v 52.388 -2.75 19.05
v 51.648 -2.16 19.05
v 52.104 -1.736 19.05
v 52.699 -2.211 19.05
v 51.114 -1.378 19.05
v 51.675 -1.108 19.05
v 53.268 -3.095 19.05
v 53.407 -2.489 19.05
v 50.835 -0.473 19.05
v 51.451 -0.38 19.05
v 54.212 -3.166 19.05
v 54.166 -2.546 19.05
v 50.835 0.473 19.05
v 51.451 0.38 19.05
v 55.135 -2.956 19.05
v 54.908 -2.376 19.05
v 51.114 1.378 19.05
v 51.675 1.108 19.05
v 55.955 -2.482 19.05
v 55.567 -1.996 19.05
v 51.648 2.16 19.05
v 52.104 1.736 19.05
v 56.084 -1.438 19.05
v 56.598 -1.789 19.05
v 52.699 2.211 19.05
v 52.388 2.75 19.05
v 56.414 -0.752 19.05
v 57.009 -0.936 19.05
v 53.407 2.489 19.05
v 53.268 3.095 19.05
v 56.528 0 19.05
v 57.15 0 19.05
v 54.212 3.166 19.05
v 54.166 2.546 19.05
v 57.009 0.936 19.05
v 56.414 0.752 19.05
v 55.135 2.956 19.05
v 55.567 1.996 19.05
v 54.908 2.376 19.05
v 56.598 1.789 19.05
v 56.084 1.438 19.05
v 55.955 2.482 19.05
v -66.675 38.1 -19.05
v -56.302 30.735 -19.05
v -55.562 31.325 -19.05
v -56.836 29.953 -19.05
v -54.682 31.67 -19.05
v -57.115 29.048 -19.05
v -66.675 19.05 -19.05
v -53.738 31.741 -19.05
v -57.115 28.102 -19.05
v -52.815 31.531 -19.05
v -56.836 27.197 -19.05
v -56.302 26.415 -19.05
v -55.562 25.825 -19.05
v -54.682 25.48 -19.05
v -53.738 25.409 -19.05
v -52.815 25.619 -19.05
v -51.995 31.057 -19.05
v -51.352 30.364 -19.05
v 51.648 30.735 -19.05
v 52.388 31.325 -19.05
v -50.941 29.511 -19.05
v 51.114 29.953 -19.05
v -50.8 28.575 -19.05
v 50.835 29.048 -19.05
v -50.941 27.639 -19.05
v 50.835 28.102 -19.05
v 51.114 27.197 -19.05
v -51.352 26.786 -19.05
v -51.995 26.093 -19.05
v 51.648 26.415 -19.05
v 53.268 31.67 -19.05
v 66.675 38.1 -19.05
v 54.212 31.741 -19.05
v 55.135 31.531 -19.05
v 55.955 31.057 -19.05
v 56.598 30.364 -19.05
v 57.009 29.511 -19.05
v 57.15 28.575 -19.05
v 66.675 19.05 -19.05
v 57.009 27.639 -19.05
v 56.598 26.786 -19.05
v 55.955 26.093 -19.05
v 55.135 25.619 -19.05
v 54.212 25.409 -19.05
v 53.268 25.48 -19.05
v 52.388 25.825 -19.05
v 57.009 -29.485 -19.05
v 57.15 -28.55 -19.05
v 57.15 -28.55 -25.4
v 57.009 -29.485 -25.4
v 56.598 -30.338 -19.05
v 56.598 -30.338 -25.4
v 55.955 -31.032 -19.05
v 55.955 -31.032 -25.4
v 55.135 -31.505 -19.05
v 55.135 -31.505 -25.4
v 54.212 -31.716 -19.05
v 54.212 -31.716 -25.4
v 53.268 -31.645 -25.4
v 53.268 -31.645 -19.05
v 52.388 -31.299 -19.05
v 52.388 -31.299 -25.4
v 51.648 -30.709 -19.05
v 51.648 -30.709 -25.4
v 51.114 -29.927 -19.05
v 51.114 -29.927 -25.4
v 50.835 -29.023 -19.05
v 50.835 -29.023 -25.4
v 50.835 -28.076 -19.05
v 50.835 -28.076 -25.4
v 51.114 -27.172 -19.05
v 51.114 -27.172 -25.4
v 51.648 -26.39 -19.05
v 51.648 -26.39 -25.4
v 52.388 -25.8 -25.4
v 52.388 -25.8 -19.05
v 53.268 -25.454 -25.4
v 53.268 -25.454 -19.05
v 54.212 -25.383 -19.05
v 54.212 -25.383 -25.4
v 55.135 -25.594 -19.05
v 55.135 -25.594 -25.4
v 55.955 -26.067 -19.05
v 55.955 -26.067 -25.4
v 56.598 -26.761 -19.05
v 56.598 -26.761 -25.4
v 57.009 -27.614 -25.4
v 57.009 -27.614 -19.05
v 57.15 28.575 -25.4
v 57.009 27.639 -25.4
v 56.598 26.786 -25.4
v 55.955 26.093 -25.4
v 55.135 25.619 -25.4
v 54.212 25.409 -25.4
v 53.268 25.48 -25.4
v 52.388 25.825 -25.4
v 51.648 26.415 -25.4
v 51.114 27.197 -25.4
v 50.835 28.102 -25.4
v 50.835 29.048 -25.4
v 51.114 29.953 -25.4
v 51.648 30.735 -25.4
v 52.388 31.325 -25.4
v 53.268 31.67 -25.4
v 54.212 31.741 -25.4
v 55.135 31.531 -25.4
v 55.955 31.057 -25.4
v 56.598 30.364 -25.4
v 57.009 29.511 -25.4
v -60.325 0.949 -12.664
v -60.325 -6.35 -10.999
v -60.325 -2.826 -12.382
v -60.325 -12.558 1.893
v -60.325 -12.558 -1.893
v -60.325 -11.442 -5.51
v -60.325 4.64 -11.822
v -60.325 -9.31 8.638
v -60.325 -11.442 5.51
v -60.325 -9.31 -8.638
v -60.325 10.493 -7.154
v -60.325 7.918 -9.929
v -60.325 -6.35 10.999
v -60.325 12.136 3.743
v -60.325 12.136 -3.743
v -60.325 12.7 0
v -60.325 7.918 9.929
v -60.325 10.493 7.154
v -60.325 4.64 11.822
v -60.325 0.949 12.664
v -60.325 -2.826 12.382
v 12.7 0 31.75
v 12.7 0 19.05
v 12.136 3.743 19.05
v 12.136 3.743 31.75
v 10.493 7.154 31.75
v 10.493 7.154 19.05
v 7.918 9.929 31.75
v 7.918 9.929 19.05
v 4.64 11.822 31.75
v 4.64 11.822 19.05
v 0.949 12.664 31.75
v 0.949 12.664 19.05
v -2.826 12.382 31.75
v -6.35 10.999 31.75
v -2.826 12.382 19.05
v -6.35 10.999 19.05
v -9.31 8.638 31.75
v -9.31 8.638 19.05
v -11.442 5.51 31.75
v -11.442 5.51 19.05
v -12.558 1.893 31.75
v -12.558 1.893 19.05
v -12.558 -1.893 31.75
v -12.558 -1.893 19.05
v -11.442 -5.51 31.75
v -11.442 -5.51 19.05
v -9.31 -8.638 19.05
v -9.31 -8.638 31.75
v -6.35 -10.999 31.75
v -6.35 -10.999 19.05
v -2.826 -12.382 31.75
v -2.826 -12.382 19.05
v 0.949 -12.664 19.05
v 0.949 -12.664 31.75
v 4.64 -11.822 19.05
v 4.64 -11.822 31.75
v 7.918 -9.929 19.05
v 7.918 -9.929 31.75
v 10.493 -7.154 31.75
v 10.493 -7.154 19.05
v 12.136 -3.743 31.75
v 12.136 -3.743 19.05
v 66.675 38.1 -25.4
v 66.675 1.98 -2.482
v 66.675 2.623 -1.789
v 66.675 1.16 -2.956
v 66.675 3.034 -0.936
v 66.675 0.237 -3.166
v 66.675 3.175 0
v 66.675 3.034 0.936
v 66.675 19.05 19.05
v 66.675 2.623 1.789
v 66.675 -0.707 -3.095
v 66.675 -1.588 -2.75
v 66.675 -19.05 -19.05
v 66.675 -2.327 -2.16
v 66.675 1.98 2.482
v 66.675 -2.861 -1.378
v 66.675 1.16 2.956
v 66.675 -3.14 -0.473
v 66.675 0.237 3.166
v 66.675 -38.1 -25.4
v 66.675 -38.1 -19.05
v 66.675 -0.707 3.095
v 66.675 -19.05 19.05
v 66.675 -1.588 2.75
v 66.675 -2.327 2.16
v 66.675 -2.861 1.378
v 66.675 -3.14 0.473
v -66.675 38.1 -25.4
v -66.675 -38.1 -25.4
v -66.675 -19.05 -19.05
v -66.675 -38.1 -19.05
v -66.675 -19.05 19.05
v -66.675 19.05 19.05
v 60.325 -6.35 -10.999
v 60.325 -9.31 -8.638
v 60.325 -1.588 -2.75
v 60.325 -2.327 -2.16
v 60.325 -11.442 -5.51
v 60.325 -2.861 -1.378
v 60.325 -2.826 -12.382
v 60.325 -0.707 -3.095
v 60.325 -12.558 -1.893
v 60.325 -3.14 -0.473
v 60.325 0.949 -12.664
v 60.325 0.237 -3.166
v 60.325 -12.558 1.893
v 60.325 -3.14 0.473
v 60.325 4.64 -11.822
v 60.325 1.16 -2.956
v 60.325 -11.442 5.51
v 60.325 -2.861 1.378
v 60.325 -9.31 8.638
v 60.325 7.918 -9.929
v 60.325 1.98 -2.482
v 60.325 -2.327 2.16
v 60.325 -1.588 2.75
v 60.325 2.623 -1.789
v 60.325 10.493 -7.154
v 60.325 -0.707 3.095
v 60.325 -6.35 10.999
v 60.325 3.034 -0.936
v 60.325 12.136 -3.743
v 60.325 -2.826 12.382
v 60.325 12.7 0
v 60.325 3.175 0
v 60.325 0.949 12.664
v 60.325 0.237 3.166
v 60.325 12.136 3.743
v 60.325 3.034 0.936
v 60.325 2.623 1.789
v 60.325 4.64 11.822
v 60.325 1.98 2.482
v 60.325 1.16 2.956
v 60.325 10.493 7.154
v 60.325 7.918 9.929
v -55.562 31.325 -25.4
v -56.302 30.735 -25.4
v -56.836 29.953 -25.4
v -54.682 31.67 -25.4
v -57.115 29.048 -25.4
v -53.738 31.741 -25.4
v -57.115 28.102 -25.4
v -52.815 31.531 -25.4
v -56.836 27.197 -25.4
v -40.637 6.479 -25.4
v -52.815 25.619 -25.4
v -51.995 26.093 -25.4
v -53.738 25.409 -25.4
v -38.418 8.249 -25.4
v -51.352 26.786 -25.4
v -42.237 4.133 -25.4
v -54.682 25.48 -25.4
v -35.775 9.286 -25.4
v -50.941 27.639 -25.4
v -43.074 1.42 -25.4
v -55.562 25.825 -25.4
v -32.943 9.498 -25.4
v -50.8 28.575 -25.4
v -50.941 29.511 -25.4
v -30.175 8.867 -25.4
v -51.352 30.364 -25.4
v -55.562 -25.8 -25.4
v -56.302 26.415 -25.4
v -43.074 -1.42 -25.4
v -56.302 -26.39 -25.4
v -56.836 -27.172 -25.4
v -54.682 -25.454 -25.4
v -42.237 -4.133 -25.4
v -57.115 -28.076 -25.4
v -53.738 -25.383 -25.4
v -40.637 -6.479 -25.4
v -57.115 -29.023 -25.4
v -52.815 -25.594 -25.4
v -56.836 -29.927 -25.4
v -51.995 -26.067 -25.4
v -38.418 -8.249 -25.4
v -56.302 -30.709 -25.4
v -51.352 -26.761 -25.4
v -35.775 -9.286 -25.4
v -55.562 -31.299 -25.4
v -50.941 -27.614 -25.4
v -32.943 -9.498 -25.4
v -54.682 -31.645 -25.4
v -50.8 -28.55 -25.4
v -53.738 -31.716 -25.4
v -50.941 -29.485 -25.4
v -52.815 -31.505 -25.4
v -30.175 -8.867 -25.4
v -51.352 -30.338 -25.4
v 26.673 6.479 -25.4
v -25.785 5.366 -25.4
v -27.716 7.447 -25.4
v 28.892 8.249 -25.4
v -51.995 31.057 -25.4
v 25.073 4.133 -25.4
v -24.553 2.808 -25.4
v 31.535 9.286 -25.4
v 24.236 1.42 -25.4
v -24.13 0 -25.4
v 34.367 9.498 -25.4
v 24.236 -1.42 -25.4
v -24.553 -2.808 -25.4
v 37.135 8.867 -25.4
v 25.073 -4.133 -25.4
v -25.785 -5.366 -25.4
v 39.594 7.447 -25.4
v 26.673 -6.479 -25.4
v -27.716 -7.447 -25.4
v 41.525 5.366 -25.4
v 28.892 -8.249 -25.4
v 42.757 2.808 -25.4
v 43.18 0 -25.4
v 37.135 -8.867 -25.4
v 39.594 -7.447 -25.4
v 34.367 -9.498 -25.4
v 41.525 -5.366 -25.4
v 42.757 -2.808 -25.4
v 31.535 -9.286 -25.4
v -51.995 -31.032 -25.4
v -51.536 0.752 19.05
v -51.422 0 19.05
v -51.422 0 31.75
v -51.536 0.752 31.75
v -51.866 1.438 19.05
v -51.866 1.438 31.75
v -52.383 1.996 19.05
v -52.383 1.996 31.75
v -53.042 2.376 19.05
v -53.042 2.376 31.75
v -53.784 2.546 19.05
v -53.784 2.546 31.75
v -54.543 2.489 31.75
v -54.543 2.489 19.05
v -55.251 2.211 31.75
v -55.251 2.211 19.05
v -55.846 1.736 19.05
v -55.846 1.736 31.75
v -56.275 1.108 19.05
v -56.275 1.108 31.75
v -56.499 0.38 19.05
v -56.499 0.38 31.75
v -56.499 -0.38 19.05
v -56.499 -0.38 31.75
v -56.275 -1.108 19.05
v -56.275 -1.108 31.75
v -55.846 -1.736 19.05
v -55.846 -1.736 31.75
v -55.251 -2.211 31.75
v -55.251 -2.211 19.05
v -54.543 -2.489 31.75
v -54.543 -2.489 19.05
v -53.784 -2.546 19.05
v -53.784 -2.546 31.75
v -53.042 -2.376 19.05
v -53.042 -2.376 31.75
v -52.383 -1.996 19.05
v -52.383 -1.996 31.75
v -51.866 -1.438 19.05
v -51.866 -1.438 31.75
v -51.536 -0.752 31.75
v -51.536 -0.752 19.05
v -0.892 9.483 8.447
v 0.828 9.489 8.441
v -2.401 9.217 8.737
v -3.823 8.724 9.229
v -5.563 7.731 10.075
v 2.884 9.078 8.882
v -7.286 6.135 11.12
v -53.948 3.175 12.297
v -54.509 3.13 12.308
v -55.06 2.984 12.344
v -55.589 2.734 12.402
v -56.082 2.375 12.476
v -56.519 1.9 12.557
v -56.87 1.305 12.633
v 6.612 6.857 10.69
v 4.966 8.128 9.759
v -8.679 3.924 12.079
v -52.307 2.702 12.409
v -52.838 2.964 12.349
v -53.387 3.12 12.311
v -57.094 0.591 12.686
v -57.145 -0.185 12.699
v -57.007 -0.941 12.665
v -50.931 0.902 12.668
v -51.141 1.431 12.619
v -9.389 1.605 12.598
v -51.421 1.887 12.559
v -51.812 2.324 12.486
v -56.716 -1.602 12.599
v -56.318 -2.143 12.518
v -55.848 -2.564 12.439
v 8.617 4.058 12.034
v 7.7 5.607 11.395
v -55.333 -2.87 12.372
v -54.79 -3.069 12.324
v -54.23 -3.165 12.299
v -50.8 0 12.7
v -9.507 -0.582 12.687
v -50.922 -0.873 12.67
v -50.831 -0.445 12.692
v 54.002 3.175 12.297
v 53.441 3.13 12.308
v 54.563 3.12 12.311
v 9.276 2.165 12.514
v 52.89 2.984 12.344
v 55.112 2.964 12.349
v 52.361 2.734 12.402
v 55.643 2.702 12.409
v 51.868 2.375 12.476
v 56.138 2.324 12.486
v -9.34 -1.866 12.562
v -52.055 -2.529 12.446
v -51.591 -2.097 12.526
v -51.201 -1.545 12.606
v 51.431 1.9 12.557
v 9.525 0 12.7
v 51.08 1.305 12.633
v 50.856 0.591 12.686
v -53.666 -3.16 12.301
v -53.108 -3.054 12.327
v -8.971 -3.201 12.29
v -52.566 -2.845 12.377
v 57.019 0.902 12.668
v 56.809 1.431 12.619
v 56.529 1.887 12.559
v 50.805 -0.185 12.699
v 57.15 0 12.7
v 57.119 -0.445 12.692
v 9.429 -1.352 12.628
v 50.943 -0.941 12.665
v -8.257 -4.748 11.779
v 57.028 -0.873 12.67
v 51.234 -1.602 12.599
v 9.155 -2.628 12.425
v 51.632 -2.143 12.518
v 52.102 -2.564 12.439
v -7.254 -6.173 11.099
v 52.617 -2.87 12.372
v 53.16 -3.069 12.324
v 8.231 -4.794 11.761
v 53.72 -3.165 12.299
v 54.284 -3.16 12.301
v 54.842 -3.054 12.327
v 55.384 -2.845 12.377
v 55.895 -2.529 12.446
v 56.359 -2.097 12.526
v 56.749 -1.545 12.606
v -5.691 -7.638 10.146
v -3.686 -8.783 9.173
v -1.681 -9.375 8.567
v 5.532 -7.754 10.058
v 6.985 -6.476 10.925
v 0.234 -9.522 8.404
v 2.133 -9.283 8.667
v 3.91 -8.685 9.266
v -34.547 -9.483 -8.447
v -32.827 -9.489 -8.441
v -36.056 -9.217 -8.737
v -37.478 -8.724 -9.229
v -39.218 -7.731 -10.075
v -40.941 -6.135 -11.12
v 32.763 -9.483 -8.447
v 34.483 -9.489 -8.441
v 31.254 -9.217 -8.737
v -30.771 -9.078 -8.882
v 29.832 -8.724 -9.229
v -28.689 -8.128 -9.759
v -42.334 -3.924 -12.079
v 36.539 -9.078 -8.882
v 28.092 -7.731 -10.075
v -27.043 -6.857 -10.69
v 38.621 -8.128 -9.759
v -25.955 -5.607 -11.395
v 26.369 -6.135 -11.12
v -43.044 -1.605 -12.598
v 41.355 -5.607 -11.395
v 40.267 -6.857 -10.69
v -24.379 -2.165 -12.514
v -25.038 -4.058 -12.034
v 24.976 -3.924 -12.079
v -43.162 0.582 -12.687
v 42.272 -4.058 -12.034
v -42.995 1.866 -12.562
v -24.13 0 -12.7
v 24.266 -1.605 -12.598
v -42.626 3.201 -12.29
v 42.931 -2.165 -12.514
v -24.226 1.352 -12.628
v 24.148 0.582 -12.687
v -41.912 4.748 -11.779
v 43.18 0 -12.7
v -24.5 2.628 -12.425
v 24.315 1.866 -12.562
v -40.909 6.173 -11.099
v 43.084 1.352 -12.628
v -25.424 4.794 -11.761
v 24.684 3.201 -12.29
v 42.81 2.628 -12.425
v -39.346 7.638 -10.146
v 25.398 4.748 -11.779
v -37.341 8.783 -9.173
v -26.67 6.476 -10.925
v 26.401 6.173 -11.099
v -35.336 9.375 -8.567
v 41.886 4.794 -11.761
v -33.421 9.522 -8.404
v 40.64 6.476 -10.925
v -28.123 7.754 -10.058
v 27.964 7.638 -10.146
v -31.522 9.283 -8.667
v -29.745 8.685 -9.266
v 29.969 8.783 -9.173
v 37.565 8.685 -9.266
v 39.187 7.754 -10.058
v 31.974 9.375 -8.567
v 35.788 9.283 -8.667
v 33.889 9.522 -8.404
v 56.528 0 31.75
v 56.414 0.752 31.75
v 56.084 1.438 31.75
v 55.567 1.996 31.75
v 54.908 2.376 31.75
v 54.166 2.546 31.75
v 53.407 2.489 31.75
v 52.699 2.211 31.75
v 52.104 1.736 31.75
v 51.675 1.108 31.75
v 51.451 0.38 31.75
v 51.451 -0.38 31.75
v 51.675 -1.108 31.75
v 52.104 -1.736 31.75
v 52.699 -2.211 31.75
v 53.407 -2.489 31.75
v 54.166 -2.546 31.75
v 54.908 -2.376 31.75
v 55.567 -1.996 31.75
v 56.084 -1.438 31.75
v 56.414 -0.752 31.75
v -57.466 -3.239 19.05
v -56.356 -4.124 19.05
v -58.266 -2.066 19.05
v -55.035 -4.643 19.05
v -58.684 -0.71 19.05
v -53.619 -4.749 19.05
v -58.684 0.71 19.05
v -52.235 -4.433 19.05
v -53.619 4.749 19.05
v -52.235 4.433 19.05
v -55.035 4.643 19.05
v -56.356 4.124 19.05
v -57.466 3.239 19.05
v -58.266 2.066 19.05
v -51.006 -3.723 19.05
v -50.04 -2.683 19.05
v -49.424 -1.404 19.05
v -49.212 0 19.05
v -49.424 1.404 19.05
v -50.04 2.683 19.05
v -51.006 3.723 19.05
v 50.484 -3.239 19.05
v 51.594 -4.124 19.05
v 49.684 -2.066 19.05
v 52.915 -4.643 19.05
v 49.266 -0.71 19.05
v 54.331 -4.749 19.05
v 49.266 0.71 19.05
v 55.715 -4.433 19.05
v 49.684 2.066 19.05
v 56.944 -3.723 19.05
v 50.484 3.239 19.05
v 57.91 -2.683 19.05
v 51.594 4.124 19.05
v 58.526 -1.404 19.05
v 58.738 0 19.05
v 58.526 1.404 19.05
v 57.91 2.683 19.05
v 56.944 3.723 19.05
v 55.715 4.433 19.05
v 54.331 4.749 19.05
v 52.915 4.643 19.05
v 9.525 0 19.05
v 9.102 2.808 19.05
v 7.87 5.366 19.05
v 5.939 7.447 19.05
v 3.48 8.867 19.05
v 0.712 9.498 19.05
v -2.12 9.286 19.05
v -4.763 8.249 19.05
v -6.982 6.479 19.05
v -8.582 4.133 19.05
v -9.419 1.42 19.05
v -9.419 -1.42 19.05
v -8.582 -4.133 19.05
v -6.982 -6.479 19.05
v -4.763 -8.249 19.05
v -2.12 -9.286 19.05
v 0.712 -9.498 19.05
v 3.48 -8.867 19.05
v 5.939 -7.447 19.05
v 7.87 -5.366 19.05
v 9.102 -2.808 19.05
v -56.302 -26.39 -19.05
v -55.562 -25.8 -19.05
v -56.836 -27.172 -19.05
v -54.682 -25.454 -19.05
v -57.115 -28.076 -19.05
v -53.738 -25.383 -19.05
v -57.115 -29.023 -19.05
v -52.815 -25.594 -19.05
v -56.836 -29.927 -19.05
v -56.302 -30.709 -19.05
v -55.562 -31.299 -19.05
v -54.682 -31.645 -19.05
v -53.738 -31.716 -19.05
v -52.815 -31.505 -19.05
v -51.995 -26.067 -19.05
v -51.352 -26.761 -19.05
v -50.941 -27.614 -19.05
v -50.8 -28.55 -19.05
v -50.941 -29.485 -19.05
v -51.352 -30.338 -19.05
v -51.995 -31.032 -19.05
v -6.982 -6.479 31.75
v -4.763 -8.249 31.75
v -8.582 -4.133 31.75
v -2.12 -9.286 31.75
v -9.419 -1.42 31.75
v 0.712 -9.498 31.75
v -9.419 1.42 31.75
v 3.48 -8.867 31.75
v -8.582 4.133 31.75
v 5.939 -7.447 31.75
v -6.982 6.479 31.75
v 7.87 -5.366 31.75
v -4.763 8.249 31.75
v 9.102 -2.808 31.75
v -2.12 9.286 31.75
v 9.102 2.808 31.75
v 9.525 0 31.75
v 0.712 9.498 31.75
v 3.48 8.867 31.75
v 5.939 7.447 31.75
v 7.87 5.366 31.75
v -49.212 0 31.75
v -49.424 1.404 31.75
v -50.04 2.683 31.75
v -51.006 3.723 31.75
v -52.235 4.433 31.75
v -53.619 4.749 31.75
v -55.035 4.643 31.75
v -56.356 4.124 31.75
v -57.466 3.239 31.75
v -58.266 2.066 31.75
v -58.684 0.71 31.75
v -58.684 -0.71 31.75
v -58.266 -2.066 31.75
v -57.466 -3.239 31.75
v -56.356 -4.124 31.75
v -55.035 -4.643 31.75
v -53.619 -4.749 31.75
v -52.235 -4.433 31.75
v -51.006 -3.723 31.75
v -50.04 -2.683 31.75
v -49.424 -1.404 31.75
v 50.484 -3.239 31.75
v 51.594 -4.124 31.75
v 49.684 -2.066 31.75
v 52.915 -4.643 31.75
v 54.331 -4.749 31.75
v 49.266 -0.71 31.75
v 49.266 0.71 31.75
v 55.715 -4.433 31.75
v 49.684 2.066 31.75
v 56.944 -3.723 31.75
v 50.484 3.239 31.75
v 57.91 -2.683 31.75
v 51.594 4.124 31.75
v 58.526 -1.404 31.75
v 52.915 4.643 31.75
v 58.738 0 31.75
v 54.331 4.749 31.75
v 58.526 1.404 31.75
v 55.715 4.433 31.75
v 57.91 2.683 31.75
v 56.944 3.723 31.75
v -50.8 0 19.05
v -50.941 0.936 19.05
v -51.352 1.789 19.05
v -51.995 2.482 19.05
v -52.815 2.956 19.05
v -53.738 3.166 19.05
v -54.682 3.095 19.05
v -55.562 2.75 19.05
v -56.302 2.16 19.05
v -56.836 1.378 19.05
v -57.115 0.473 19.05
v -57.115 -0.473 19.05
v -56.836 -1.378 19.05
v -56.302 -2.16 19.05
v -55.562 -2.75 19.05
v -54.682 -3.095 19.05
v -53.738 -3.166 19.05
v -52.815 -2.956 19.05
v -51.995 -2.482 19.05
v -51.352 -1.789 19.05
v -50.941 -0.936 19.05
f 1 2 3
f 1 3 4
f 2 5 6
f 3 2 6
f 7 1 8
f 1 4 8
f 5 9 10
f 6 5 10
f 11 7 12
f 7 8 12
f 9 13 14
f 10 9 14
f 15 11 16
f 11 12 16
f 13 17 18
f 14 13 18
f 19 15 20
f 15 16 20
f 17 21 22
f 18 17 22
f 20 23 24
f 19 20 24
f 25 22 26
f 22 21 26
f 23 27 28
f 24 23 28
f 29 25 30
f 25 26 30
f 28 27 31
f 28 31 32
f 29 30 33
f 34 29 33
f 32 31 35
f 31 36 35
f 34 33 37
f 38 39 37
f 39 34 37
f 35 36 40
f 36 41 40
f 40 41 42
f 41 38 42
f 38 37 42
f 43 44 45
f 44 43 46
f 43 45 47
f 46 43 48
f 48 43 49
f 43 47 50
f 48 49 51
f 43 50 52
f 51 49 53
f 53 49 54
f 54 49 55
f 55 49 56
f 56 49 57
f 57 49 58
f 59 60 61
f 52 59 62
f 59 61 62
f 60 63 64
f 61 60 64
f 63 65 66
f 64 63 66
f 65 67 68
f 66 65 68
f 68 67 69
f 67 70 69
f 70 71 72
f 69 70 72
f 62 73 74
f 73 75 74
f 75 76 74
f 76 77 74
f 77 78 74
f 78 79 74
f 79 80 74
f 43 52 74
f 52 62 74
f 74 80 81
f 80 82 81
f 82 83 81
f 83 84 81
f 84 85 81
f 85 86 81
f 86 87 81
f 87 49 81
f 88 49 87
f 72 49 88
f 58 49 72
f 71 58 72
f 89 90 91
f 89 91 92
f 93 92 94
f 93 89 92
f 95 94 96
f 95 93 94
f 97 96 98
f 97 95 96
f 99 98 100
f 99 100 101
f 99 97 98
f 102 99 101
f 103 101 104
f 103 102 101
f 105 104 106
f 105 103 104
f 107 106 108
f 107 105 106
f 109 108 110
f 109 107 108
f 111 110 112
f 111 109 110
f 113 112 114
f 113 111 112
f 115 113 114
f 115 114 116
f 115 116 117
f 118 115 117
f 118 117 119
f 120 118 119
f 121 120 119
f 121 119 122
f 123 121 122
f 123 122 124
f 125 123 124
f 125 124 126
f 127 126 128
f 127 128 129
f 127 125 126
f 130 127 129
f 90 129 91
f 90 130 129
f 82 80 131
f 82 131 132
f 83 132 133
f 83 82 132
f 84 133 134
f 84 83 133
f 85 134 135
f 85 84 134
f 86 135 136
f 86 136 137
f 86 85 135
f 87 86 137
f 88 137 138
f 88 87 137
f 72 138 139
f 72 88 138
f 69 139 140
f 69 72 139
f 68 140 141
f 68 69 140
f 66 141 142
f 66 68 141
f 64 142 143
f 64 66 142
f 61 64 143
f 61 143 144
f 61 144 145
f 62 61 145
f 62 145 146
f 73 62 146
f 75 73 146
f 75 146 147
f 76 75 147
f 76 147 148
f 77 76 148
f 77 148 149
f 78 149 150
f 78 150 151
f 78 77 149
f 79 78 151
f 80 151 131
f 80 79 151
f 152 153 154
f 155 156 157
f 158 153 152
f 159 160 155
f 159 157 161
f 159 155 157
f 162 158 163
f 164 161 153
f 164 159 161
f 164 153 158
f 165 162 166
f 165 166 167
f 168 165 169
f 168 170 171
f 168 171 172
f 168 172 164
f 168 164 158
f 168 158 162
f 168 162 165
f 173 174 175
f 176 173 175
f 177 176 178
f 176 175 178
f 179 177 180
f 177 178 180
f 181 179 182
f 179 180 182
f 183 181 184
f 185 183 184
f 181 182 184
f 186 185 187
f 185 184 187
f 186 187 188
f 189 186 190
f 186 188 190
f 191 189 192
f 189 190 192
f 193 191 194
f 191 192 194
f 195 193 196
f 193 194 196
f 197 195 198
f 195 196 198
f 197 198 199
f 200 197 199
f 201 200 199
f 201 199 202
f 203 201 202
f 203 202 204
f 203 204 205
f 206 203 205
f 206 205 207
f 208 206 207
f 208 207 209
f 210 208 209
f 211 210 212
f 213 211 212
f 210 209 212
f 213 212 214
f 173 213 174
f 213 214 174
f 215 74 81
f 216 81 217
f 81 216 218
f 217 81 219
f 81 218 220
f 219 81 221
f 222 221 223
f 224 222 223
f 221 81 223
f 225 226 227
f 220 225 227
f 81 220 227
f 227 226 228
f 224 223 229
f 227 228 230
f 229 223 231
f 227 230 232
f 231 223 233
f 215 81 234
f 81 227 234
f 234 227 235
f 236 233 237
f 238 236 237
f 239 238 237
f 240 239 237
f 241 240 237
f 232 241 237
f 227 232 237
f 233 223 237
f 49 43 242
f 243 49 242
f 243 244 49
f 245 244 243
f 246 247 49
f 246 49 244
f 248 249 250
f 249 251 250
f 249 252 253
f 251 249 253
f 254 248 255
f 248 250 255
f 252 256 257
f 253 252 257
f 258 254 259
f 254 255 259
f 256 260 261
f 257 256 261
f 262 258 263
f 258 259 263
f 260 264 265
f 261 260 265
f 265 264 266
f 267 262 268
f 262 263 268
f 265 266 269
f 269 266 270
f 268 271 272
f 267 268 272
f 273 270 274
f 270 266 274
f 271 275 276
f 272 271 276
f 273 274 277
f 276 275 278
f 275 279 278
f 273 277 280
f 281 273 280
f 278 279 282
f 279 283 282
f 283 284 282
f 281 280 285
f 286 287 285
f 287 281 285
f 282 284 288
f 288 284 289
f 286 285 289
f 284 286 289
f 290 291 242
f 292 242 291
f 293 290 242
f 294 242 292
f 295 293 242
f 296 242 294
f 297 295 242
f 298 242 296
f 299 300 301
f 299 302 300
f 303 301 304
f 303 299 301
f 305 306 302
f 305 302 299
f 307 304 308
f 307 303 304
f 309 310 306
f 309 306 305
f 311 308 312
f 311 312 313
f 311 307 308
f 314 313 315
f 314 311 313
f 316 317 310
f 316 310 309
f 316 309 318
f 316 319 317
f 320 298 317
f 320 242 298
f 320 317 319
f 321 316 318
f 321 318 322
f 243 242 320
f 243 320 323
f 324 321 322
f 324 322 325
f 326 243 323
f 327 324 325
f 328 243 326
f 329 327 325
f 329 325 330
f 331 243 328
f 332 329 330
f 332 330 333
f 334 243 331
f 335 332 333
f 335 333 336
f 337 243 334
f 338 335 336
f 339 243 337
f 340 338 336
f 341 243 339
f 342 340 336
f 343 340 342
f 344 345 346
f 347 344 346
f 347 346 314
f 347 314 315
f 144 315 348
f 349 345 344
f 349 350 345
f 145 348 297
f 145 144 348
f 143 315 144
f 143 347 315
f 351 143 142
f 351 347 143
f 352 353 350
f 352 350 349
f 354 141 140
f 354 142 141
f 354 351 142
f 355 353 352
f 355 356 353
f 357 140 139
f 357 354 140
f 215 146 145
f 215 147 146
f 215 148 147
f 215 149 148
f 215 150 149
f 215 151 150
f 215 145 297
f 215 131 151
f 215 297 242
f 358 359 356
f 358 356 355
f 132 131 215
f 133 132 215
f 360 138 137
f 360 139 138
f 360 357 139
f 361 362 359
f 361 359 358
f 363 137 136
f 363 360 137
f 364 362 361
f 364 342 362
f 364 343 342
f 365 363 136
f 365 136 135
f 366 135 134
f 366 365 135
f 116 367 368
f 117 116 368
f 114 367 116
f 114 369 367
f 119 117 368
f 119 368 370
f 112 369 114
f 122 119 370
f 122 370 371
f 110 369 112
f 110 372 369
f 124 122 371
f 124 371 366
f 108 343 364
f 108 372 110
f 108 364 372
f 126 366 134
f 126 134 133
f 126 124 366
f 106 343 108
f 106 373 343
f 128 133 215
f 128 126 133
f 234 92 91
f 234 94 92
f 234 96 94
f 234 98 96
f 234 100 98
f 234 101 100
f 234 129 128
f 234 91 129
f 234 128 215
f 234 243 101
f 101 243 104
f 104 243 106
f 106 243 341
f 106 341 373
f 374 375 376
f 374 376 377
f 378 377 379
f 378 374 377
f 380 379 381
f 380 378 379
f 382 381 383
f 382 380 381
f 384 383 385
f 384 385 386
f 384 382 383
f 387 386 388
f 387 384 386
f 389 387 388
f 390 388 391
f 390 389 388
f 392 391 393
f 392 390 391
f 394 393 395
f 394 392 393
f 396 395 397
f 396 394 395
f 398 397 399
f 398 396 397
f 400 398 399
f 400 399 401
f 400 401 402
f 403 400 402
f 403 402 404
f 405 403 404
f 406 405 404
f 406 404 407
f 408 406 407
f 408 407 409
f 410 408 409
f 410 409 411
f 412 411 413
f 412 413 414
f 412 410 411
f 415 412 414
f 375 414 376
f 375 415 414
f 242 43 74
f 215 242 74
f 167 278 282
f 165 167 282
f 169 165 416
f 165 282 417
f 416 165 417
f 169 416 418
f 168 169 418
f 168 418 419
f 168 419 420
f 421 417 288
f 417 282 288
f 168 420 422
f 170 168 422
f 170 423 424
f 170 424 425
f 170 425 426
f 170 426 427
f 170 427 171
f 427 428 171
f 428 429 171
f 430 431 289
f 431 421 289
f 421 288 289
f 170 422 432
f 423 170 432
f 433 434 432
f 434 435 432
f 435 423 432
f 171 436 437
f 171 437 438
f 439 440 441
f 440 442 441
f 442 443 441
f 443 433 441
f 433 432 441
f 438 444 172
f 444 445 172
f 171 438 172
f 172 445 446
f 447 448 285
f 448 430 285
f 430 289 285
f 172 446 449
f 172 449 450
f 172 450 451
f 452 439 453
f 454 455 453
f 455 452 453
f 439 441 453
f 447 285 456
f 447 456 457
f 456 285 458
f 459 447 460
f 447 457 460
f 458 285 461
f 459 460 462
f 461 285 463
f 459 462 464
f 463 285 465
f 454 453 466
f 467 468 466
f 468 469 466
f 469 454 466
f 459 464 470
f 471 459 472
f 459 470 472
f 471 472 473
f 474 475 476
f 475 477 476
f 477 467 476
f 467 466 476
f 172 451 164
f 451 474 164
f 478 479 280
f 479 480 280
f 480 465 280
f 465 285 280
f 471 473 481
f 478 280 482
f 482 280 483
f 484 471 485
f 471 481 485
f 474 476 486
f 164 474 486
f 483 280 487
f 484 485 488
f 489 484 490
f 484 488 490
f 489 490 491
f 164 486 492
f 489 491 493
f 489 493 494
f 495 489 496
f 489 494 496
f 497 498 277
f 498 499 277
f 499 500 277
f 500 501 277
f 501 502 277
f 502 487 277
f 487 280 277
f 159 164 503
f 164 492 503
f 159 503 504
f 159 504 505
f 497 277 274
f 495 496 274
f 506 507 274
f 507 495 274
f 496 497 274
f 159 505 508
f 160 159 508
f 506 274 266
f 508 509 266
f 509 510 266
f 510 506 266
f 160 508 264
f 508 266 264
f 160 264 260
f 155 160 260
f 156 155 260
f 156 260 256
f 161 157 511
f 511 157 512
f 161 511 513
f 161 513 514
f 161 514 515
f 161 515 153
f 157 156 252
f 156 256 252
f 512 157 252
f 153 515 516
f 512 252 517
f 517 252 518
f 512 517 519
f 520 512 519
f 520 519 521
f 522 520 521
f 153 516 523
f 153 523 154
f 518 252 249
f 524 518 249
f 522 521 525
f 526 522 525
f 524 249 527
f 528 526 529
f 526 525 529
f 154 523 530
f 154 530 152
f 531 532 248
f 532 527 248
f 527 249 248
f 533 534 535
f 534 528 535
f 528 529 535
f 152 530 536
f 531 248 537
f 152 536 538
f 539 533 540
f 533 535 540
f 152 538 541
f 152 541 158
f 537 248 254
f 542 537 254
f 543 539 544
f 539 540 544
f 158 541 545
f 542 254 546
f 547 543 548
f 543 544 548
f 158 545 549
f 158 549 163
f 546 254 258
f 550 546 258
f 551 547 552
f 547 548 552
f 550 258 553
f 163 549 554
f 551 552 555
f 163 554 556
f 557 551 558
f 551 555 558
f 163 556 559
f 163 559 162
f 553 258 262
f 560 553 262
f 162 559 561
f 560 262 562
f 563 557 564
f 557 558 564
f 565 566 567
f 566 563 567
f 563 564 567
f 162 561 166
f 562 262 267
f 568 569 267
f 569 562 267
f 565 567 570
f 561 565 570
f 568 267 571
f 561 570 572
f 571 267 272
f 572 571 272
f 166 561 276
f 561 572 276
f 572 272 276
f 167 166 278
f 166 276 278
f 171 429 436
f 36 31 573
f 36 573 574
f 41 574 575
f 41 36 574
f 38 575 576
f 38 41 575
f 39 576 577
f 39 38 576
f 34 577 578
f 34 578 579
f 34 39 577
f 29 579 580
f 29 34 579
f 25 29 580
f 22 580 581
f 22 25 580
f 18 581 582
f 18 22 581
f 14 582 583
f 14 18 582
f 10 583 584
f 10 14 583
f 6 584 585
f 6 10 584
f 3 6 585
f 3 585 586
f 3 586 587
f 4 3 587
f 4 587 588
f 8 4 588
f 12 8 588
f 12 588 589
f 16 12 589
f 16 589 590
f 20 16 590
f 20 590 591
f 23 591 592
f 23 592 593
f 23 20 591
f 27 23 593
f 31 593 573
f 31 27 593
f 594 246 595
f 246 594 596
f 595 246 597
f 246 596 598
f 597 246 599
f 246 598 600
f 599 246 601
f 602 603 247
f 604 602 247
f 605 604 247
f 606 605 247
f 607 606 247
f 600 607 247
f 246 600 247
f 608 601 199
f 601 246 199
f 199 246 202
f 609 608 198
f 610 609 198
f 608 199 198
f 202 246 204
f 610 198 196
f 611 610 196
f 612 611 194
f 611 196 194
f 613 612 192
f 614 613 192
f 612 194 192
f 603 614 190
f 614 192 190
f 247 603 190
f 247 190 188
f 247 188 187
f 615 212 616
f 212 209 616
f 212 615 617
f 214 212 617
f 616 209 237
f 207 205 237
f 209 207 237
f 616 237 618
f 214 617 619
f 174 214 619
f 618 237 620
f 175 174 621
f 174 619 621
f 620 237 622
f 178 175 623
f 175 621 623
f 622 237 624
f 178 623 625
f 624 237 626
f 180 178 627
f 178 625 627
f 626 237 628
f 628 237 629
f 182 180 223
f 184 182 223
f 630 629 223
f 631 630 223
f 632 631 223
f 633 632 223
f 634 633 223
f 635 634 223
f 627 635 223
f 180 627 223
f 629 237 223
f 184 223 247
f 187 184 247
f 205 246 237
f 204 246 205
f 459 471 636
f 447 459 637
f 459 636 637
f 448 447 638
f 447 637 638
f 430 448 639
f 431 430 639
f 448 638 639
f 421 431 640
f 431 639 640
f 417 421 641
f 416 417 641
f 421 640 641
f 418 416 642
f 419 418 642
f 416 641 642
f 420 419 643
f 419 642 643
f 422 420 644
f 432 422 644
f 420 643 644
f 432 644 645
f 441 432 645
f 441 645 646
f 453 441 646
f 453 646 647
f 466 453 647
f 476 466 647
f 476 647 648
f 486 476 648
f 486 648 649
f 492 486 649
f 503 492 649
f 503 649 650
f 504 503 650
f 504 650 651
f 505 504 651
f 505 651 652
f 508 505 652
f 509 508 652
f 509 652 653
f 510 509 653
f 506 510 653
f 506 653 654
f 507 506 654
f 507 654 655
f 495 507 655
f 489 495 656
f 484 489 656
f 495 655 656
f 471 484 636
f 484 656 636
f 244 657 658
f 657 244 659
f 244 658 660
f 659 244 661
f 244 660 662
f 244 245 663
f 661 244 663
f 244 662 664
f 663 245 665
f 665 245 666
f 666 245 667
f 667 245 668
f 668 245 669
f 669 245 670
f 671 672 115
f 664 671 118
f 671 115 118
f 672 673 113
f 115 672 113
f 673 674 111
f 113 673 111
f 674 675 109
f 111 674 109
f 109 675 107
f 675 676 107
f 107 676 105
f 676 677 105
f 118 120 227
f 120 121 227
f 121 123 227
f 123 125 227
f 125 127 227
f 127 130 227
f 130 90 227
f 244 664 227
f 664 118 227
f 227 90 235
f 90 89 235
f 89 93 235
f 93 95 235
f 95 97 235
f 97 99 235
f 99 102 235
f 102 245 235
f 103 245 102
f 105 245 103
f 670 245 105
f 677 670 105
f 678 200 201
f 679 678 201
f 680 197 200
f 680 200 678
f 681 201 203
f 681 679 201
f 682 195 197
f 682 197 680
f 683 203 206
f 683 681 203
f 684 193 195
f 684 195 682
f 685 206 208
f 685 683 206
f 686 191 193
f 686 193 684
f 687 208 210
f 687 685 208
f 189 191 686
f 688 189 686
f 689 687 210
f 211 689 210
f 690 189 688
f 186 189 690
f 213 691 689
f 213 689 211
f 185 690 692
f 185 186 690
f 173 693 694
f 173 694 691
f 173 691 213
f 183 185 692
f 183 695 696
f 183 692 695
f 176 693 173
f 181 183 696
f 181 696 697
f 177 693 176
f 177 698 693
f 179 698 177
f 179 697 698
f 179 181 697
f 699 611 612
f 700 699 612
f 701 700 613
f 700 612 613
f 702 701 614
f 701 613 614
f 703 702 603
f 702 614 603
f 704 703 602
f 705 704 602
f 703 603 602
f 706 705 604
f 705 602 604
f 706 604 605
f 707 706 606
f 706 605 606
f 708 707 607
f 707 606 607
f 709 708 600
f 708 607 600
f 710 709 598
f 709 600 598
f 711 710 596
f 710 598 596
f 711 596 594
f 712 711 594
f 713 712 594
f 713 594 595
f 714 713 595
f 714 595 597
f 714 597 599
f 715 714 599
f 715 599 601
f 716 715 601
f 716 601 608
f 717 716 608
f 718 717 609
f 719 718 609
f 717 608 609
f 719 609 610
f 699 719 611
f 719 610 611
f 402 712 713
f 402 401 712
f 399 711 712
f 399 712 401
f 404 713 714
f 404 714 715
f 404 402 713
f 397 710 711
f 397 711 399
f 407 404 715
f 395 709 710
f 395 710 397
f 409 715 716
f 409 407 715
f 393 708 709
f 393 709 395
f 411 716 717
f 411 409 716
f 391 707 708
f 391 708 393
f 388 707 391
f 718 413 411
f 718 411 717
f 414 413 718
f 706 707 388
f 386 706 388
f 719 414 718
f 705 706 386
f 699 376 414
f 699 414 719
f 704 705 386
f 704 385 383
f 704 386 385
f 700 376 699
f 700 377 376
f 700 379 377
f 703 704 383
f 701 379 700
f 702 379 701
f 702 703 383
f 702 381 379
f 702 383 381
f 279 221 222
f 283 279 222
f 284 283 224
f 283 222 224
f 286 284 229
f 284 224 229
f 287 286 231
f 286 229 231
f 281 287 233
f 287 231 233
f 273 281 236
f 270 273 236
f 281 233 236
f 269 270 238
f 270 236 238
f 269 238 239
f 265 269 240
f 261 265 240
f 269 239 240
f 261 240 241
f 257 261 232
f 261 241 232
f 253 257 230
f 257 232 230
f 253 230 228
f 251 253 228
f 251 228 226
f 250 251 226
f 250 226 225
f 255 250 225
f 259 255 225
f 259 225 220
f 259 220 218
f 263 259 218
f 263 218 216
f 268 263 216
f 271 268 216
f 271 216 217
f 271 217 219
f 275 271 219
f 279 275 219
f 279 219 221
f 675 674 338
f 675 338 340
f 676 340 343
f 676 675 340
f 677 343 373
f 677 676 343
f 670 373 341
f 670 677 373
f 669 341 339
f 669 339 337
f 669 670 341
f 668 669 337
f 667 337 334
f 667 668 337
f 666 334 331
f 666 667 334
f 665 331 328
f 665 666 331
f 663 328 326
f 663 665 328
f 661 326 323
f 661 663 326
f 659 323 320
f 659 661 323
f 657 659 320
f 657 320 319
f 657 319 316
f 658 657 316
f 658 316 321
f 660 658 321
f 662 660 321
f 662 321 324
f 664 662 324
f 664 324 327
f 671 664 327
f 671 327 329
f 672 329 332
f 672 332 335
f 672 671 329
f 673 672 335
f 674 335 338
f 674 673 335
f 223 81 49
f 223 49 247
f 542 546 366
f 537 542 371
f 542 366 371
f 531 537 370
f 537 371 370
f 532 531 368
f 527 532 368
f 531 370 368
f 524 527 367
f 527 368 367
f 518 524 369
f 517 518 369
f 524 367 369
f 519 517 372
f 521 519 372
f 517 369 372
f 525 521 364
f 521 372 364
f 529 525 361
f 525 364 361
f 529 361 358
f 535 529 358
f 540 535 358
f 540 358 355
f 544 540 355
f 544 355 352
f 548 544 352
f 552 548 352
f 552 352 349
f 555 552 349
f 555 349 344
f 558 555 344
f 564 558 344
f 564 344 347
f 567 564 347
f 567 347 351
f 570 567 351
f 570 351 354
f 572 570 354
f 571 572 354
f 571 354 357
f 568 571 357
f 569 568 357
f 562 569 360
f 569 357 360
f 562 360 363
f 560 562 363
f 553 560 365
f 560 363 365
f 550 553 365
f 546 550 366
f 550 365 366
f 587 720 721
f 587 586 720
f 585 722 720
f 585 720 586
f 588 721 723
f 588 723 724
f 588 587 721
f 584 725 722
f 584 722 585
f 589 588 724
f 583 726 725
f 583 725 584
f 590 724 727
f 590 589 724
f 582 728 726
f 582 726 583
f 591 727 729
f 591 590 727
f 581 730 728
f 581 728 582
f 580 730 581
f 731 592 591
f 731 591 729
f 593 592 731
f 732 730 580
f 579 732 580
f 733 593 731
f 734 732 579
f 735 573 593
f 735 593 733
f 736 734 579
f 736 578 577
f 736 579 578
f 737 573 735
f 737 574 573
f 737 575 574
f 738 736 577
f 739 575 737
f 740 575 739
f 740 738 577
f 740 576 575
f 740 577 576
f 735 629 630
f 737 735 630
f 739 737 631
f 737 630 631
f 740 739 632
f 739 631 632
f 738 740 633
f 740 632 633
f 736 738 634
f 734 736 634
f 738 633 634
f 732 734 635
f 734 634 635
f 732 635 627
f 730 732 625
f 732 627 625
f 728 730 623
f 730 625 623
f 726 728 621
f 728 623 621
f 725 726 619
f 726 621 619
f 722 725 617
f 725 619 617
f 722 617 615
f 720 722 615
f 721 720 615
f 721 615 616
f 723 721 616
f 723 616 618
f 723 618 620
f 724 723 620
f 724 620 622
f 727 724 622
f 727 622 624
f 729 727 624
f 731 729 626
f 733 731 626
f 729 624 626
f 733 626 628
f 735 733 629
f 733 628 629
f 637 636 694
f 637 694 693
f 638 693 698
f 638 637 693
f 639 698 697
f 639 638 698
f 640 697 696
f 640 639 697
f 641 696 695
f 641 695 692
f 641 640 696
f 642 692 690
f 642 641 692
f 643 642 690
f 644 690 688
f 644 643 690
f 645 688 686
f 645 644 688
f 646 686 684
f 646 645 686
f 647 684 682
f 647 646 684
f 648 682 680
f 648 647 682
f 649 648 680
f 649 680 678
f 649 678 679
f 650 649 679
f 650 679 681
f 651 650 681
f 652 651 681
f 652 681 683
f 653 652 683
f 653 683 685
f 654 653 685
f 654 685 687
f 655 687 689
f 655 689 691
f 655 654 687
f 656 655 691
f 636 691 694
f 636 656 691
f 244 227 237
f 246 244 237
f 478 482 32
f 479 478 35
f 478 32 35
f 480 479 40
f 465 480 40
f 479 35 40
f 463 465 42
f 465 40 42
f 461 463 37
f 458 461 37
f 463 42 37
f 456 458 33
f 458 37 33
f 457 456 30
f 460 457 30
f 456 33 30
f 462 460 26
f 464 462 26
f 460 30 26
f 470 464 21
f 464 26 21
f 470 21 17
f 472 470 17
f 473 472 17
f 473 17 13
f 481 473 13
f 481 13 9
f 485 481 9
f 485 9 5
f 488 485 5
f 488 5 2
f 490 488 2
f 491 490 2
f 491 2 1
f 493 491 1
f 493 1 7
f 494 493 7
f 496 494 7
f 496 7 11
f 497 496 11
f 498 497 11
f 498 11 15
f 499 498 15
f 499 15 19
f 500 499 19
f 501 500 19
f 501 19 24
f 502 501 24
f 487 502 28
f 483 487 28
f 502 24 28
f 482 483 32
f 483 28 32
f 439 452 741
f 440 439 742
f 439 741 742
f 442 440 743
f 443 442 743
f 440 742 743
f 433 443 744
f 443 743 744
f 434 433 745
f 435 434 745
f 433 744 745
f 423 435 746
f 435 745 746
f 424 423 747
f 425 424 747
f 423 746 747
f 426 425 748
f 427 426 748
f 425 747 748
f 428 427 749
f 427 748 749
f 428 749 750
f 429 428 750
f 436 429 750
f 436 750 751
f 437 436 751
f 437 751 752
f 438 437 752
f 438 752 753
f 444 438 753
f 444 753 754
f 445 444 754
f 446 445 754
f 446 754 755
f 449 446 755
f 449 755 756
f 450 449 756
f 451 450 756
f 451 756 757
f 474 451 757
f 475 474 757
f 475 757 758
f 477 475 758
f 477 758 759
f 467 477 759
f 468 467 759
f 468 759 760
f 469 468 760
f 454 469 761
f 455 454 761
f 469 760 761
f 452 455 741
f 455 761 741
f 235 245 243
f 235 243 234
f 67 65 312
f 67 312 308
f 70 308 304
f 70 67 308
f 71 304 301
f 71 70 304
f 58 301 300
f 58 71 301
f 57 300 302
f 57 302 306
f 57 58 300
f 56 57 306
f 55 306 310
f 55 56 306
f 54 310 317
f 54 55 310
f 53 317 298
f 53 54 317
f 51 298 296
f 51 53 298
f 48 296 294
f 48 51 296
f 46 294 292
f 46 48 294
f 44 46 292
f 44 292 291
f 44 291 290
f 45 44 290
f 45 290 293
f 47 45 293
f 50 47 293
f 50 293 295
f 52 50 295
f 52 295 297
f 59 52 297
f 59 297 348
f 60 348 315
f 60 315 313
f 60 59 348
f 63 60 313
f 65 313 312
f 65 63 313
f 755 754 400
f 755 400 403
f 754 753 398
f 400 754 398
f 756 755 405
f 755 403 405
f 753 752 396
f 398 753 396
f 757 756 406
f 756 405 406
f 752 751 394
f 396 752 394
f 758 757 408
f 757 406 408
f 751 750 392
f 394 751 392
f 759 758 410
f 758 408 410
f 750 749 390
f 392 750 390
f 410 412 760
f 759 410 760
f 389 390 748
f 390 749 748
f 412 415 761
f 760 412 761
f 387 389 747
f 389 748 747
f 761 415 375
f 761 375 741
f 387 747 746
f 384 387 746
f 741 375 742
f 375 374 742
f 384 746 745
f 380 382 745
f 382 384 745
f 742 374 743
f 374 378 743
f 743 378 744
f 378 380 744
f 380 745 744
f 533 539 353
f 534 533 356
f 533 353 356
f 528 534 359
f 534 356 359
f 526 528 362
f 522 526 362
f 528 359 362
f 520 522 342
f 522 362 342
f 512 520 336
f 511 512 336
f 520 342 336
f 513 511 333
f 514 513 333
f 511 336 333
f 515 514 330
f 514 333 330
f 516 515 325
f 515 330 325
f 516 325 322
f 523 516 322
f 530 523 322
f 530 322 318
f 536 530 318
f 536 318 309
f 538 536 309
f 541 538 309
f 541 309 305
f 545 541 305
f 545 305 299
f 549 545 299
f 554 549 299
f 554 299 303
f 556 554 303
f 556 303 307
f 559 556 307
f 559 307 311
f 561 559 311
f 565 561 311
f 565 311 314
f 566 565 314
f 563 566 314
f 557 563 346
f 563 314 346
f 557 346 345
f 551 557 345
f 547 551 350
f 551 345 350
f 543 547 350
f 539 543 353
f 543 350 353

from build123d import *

# Parameters (mm, degrees)
F0_W      = 38.1
F0_H      = 38.1
F1_DEPTH  = 66.675
F3_R      = 12.7
F4_DEPTH  = 120.65
F5_W      = 133.35
F5_H      = 76.2
F5_R      = 3.175
F6_DEPTH  = 6.35
F7_R      = 9.525
F8_DEPTH  = 25.4
F9_R      = 9.525
F9_R_2    = 3.175
F10_DEPTH = 19.05
F11_R     = 4.7625
F11_R_2   = 2.5527
F11_R_3   = 12.7
F11_R_4   = 9.525
F12_DEPTH = 12.7
F13_R     = 3.175
F14_DEPTH = 12.7


with BuildPart() as f1:
    # F0 (on Right) → F1 (new body, symmetric)
    with BuildSketch(Plane.YZ):
        Rectangle(F0_W, F0_H)
    extrude(amount=F1_DEPTH, both=True)

    # F3 (on offset) → F4 (cut)
    with BuildSketch(Plane.YZ.offset(60.325)):
        Circle(F3_R)
    extrude(amount=-F4_DEPTH, mode=Mode.SUBTRACT)

    # F5 (on face) → F6 (join)
    with BuildSketch(Plane(origin=(0, 0, -19.05), x_dir=(1, 0, 0), z_dir=(0, 0, -1))):
        Rectangle(F5_W, F5_H)
        with Locations((-53.975, -28.575)):
            Circle(F5_R, mode=Mode.SUBTRACT)
        with Locations((53.975, -28.575)):
            Circle(F5_R, mode=Mode.SUBTRACT)
        with Locations((-53.975, 28.5496)):
            Circle(F5_R, mode=Mode.SUBTRACT)
        with Locations((53.975, 28.5496)):
            Circle(F5_R, mode=Mode.SUBTRACT)
    extrude(amount=F6_DEPTH)

    # F7 (on face) → F8 (cut)
    with BuildSketch(Plane(origin=(0, 0, -25.4), x_dir=(1, 0, 0), z_dir=(0, 0, -1))):
        with Locations((-33.655, 0)):
            Circle(F7_R)
        with Locations((33.655, 0)):
            Circle(F7_R)
    extrude(amount=-F8_DEPTH, mode=Mode.SUBTRACT)

    # F9 (on face) → F10 (cut)
    with BuildSketch(Plane.XY.offset(19.05)):
        Circle(F9_R)
        with Locations((-53.975, 0)):
            Circle(F9_R_2)
        with Locations((53.975, 0)):
            Circle(F9_R_2)
    extrude(amount=-F10_DEPTH, mode=Mode.SUBTRACT)

    # F11 (on face) → F12 (join)
    with BuildSketch(Plane.XY.offset(19.05)):
        with Locations((-53.975, 0)):
            Circle(F11_R)
        with Locations((-53.975, 0)):
            Circle(F11_R_2, mode=Mode.SUBTRACT)
        Circle(F11_R_3)
        Circle(F11_R_4, mode=Mode.SUBTRACT)
        with Locations((53.975, 0)):
            Circle(F11_R)
        with Locations((53.975, 0)):
            Circle(F11_R_2, mode=Mode.SUBTRACT)
    extrude(amount=F12_DEPTH)

    # F13 (on face) → F14 (cut)
    with BuildSketch(Plane.YZ.offset(66.675)):
        Circle(F13_R)
    extrude(amount=-F14_DEPTH, mode=Mode.SUBTRACT)


solid = f1.part
